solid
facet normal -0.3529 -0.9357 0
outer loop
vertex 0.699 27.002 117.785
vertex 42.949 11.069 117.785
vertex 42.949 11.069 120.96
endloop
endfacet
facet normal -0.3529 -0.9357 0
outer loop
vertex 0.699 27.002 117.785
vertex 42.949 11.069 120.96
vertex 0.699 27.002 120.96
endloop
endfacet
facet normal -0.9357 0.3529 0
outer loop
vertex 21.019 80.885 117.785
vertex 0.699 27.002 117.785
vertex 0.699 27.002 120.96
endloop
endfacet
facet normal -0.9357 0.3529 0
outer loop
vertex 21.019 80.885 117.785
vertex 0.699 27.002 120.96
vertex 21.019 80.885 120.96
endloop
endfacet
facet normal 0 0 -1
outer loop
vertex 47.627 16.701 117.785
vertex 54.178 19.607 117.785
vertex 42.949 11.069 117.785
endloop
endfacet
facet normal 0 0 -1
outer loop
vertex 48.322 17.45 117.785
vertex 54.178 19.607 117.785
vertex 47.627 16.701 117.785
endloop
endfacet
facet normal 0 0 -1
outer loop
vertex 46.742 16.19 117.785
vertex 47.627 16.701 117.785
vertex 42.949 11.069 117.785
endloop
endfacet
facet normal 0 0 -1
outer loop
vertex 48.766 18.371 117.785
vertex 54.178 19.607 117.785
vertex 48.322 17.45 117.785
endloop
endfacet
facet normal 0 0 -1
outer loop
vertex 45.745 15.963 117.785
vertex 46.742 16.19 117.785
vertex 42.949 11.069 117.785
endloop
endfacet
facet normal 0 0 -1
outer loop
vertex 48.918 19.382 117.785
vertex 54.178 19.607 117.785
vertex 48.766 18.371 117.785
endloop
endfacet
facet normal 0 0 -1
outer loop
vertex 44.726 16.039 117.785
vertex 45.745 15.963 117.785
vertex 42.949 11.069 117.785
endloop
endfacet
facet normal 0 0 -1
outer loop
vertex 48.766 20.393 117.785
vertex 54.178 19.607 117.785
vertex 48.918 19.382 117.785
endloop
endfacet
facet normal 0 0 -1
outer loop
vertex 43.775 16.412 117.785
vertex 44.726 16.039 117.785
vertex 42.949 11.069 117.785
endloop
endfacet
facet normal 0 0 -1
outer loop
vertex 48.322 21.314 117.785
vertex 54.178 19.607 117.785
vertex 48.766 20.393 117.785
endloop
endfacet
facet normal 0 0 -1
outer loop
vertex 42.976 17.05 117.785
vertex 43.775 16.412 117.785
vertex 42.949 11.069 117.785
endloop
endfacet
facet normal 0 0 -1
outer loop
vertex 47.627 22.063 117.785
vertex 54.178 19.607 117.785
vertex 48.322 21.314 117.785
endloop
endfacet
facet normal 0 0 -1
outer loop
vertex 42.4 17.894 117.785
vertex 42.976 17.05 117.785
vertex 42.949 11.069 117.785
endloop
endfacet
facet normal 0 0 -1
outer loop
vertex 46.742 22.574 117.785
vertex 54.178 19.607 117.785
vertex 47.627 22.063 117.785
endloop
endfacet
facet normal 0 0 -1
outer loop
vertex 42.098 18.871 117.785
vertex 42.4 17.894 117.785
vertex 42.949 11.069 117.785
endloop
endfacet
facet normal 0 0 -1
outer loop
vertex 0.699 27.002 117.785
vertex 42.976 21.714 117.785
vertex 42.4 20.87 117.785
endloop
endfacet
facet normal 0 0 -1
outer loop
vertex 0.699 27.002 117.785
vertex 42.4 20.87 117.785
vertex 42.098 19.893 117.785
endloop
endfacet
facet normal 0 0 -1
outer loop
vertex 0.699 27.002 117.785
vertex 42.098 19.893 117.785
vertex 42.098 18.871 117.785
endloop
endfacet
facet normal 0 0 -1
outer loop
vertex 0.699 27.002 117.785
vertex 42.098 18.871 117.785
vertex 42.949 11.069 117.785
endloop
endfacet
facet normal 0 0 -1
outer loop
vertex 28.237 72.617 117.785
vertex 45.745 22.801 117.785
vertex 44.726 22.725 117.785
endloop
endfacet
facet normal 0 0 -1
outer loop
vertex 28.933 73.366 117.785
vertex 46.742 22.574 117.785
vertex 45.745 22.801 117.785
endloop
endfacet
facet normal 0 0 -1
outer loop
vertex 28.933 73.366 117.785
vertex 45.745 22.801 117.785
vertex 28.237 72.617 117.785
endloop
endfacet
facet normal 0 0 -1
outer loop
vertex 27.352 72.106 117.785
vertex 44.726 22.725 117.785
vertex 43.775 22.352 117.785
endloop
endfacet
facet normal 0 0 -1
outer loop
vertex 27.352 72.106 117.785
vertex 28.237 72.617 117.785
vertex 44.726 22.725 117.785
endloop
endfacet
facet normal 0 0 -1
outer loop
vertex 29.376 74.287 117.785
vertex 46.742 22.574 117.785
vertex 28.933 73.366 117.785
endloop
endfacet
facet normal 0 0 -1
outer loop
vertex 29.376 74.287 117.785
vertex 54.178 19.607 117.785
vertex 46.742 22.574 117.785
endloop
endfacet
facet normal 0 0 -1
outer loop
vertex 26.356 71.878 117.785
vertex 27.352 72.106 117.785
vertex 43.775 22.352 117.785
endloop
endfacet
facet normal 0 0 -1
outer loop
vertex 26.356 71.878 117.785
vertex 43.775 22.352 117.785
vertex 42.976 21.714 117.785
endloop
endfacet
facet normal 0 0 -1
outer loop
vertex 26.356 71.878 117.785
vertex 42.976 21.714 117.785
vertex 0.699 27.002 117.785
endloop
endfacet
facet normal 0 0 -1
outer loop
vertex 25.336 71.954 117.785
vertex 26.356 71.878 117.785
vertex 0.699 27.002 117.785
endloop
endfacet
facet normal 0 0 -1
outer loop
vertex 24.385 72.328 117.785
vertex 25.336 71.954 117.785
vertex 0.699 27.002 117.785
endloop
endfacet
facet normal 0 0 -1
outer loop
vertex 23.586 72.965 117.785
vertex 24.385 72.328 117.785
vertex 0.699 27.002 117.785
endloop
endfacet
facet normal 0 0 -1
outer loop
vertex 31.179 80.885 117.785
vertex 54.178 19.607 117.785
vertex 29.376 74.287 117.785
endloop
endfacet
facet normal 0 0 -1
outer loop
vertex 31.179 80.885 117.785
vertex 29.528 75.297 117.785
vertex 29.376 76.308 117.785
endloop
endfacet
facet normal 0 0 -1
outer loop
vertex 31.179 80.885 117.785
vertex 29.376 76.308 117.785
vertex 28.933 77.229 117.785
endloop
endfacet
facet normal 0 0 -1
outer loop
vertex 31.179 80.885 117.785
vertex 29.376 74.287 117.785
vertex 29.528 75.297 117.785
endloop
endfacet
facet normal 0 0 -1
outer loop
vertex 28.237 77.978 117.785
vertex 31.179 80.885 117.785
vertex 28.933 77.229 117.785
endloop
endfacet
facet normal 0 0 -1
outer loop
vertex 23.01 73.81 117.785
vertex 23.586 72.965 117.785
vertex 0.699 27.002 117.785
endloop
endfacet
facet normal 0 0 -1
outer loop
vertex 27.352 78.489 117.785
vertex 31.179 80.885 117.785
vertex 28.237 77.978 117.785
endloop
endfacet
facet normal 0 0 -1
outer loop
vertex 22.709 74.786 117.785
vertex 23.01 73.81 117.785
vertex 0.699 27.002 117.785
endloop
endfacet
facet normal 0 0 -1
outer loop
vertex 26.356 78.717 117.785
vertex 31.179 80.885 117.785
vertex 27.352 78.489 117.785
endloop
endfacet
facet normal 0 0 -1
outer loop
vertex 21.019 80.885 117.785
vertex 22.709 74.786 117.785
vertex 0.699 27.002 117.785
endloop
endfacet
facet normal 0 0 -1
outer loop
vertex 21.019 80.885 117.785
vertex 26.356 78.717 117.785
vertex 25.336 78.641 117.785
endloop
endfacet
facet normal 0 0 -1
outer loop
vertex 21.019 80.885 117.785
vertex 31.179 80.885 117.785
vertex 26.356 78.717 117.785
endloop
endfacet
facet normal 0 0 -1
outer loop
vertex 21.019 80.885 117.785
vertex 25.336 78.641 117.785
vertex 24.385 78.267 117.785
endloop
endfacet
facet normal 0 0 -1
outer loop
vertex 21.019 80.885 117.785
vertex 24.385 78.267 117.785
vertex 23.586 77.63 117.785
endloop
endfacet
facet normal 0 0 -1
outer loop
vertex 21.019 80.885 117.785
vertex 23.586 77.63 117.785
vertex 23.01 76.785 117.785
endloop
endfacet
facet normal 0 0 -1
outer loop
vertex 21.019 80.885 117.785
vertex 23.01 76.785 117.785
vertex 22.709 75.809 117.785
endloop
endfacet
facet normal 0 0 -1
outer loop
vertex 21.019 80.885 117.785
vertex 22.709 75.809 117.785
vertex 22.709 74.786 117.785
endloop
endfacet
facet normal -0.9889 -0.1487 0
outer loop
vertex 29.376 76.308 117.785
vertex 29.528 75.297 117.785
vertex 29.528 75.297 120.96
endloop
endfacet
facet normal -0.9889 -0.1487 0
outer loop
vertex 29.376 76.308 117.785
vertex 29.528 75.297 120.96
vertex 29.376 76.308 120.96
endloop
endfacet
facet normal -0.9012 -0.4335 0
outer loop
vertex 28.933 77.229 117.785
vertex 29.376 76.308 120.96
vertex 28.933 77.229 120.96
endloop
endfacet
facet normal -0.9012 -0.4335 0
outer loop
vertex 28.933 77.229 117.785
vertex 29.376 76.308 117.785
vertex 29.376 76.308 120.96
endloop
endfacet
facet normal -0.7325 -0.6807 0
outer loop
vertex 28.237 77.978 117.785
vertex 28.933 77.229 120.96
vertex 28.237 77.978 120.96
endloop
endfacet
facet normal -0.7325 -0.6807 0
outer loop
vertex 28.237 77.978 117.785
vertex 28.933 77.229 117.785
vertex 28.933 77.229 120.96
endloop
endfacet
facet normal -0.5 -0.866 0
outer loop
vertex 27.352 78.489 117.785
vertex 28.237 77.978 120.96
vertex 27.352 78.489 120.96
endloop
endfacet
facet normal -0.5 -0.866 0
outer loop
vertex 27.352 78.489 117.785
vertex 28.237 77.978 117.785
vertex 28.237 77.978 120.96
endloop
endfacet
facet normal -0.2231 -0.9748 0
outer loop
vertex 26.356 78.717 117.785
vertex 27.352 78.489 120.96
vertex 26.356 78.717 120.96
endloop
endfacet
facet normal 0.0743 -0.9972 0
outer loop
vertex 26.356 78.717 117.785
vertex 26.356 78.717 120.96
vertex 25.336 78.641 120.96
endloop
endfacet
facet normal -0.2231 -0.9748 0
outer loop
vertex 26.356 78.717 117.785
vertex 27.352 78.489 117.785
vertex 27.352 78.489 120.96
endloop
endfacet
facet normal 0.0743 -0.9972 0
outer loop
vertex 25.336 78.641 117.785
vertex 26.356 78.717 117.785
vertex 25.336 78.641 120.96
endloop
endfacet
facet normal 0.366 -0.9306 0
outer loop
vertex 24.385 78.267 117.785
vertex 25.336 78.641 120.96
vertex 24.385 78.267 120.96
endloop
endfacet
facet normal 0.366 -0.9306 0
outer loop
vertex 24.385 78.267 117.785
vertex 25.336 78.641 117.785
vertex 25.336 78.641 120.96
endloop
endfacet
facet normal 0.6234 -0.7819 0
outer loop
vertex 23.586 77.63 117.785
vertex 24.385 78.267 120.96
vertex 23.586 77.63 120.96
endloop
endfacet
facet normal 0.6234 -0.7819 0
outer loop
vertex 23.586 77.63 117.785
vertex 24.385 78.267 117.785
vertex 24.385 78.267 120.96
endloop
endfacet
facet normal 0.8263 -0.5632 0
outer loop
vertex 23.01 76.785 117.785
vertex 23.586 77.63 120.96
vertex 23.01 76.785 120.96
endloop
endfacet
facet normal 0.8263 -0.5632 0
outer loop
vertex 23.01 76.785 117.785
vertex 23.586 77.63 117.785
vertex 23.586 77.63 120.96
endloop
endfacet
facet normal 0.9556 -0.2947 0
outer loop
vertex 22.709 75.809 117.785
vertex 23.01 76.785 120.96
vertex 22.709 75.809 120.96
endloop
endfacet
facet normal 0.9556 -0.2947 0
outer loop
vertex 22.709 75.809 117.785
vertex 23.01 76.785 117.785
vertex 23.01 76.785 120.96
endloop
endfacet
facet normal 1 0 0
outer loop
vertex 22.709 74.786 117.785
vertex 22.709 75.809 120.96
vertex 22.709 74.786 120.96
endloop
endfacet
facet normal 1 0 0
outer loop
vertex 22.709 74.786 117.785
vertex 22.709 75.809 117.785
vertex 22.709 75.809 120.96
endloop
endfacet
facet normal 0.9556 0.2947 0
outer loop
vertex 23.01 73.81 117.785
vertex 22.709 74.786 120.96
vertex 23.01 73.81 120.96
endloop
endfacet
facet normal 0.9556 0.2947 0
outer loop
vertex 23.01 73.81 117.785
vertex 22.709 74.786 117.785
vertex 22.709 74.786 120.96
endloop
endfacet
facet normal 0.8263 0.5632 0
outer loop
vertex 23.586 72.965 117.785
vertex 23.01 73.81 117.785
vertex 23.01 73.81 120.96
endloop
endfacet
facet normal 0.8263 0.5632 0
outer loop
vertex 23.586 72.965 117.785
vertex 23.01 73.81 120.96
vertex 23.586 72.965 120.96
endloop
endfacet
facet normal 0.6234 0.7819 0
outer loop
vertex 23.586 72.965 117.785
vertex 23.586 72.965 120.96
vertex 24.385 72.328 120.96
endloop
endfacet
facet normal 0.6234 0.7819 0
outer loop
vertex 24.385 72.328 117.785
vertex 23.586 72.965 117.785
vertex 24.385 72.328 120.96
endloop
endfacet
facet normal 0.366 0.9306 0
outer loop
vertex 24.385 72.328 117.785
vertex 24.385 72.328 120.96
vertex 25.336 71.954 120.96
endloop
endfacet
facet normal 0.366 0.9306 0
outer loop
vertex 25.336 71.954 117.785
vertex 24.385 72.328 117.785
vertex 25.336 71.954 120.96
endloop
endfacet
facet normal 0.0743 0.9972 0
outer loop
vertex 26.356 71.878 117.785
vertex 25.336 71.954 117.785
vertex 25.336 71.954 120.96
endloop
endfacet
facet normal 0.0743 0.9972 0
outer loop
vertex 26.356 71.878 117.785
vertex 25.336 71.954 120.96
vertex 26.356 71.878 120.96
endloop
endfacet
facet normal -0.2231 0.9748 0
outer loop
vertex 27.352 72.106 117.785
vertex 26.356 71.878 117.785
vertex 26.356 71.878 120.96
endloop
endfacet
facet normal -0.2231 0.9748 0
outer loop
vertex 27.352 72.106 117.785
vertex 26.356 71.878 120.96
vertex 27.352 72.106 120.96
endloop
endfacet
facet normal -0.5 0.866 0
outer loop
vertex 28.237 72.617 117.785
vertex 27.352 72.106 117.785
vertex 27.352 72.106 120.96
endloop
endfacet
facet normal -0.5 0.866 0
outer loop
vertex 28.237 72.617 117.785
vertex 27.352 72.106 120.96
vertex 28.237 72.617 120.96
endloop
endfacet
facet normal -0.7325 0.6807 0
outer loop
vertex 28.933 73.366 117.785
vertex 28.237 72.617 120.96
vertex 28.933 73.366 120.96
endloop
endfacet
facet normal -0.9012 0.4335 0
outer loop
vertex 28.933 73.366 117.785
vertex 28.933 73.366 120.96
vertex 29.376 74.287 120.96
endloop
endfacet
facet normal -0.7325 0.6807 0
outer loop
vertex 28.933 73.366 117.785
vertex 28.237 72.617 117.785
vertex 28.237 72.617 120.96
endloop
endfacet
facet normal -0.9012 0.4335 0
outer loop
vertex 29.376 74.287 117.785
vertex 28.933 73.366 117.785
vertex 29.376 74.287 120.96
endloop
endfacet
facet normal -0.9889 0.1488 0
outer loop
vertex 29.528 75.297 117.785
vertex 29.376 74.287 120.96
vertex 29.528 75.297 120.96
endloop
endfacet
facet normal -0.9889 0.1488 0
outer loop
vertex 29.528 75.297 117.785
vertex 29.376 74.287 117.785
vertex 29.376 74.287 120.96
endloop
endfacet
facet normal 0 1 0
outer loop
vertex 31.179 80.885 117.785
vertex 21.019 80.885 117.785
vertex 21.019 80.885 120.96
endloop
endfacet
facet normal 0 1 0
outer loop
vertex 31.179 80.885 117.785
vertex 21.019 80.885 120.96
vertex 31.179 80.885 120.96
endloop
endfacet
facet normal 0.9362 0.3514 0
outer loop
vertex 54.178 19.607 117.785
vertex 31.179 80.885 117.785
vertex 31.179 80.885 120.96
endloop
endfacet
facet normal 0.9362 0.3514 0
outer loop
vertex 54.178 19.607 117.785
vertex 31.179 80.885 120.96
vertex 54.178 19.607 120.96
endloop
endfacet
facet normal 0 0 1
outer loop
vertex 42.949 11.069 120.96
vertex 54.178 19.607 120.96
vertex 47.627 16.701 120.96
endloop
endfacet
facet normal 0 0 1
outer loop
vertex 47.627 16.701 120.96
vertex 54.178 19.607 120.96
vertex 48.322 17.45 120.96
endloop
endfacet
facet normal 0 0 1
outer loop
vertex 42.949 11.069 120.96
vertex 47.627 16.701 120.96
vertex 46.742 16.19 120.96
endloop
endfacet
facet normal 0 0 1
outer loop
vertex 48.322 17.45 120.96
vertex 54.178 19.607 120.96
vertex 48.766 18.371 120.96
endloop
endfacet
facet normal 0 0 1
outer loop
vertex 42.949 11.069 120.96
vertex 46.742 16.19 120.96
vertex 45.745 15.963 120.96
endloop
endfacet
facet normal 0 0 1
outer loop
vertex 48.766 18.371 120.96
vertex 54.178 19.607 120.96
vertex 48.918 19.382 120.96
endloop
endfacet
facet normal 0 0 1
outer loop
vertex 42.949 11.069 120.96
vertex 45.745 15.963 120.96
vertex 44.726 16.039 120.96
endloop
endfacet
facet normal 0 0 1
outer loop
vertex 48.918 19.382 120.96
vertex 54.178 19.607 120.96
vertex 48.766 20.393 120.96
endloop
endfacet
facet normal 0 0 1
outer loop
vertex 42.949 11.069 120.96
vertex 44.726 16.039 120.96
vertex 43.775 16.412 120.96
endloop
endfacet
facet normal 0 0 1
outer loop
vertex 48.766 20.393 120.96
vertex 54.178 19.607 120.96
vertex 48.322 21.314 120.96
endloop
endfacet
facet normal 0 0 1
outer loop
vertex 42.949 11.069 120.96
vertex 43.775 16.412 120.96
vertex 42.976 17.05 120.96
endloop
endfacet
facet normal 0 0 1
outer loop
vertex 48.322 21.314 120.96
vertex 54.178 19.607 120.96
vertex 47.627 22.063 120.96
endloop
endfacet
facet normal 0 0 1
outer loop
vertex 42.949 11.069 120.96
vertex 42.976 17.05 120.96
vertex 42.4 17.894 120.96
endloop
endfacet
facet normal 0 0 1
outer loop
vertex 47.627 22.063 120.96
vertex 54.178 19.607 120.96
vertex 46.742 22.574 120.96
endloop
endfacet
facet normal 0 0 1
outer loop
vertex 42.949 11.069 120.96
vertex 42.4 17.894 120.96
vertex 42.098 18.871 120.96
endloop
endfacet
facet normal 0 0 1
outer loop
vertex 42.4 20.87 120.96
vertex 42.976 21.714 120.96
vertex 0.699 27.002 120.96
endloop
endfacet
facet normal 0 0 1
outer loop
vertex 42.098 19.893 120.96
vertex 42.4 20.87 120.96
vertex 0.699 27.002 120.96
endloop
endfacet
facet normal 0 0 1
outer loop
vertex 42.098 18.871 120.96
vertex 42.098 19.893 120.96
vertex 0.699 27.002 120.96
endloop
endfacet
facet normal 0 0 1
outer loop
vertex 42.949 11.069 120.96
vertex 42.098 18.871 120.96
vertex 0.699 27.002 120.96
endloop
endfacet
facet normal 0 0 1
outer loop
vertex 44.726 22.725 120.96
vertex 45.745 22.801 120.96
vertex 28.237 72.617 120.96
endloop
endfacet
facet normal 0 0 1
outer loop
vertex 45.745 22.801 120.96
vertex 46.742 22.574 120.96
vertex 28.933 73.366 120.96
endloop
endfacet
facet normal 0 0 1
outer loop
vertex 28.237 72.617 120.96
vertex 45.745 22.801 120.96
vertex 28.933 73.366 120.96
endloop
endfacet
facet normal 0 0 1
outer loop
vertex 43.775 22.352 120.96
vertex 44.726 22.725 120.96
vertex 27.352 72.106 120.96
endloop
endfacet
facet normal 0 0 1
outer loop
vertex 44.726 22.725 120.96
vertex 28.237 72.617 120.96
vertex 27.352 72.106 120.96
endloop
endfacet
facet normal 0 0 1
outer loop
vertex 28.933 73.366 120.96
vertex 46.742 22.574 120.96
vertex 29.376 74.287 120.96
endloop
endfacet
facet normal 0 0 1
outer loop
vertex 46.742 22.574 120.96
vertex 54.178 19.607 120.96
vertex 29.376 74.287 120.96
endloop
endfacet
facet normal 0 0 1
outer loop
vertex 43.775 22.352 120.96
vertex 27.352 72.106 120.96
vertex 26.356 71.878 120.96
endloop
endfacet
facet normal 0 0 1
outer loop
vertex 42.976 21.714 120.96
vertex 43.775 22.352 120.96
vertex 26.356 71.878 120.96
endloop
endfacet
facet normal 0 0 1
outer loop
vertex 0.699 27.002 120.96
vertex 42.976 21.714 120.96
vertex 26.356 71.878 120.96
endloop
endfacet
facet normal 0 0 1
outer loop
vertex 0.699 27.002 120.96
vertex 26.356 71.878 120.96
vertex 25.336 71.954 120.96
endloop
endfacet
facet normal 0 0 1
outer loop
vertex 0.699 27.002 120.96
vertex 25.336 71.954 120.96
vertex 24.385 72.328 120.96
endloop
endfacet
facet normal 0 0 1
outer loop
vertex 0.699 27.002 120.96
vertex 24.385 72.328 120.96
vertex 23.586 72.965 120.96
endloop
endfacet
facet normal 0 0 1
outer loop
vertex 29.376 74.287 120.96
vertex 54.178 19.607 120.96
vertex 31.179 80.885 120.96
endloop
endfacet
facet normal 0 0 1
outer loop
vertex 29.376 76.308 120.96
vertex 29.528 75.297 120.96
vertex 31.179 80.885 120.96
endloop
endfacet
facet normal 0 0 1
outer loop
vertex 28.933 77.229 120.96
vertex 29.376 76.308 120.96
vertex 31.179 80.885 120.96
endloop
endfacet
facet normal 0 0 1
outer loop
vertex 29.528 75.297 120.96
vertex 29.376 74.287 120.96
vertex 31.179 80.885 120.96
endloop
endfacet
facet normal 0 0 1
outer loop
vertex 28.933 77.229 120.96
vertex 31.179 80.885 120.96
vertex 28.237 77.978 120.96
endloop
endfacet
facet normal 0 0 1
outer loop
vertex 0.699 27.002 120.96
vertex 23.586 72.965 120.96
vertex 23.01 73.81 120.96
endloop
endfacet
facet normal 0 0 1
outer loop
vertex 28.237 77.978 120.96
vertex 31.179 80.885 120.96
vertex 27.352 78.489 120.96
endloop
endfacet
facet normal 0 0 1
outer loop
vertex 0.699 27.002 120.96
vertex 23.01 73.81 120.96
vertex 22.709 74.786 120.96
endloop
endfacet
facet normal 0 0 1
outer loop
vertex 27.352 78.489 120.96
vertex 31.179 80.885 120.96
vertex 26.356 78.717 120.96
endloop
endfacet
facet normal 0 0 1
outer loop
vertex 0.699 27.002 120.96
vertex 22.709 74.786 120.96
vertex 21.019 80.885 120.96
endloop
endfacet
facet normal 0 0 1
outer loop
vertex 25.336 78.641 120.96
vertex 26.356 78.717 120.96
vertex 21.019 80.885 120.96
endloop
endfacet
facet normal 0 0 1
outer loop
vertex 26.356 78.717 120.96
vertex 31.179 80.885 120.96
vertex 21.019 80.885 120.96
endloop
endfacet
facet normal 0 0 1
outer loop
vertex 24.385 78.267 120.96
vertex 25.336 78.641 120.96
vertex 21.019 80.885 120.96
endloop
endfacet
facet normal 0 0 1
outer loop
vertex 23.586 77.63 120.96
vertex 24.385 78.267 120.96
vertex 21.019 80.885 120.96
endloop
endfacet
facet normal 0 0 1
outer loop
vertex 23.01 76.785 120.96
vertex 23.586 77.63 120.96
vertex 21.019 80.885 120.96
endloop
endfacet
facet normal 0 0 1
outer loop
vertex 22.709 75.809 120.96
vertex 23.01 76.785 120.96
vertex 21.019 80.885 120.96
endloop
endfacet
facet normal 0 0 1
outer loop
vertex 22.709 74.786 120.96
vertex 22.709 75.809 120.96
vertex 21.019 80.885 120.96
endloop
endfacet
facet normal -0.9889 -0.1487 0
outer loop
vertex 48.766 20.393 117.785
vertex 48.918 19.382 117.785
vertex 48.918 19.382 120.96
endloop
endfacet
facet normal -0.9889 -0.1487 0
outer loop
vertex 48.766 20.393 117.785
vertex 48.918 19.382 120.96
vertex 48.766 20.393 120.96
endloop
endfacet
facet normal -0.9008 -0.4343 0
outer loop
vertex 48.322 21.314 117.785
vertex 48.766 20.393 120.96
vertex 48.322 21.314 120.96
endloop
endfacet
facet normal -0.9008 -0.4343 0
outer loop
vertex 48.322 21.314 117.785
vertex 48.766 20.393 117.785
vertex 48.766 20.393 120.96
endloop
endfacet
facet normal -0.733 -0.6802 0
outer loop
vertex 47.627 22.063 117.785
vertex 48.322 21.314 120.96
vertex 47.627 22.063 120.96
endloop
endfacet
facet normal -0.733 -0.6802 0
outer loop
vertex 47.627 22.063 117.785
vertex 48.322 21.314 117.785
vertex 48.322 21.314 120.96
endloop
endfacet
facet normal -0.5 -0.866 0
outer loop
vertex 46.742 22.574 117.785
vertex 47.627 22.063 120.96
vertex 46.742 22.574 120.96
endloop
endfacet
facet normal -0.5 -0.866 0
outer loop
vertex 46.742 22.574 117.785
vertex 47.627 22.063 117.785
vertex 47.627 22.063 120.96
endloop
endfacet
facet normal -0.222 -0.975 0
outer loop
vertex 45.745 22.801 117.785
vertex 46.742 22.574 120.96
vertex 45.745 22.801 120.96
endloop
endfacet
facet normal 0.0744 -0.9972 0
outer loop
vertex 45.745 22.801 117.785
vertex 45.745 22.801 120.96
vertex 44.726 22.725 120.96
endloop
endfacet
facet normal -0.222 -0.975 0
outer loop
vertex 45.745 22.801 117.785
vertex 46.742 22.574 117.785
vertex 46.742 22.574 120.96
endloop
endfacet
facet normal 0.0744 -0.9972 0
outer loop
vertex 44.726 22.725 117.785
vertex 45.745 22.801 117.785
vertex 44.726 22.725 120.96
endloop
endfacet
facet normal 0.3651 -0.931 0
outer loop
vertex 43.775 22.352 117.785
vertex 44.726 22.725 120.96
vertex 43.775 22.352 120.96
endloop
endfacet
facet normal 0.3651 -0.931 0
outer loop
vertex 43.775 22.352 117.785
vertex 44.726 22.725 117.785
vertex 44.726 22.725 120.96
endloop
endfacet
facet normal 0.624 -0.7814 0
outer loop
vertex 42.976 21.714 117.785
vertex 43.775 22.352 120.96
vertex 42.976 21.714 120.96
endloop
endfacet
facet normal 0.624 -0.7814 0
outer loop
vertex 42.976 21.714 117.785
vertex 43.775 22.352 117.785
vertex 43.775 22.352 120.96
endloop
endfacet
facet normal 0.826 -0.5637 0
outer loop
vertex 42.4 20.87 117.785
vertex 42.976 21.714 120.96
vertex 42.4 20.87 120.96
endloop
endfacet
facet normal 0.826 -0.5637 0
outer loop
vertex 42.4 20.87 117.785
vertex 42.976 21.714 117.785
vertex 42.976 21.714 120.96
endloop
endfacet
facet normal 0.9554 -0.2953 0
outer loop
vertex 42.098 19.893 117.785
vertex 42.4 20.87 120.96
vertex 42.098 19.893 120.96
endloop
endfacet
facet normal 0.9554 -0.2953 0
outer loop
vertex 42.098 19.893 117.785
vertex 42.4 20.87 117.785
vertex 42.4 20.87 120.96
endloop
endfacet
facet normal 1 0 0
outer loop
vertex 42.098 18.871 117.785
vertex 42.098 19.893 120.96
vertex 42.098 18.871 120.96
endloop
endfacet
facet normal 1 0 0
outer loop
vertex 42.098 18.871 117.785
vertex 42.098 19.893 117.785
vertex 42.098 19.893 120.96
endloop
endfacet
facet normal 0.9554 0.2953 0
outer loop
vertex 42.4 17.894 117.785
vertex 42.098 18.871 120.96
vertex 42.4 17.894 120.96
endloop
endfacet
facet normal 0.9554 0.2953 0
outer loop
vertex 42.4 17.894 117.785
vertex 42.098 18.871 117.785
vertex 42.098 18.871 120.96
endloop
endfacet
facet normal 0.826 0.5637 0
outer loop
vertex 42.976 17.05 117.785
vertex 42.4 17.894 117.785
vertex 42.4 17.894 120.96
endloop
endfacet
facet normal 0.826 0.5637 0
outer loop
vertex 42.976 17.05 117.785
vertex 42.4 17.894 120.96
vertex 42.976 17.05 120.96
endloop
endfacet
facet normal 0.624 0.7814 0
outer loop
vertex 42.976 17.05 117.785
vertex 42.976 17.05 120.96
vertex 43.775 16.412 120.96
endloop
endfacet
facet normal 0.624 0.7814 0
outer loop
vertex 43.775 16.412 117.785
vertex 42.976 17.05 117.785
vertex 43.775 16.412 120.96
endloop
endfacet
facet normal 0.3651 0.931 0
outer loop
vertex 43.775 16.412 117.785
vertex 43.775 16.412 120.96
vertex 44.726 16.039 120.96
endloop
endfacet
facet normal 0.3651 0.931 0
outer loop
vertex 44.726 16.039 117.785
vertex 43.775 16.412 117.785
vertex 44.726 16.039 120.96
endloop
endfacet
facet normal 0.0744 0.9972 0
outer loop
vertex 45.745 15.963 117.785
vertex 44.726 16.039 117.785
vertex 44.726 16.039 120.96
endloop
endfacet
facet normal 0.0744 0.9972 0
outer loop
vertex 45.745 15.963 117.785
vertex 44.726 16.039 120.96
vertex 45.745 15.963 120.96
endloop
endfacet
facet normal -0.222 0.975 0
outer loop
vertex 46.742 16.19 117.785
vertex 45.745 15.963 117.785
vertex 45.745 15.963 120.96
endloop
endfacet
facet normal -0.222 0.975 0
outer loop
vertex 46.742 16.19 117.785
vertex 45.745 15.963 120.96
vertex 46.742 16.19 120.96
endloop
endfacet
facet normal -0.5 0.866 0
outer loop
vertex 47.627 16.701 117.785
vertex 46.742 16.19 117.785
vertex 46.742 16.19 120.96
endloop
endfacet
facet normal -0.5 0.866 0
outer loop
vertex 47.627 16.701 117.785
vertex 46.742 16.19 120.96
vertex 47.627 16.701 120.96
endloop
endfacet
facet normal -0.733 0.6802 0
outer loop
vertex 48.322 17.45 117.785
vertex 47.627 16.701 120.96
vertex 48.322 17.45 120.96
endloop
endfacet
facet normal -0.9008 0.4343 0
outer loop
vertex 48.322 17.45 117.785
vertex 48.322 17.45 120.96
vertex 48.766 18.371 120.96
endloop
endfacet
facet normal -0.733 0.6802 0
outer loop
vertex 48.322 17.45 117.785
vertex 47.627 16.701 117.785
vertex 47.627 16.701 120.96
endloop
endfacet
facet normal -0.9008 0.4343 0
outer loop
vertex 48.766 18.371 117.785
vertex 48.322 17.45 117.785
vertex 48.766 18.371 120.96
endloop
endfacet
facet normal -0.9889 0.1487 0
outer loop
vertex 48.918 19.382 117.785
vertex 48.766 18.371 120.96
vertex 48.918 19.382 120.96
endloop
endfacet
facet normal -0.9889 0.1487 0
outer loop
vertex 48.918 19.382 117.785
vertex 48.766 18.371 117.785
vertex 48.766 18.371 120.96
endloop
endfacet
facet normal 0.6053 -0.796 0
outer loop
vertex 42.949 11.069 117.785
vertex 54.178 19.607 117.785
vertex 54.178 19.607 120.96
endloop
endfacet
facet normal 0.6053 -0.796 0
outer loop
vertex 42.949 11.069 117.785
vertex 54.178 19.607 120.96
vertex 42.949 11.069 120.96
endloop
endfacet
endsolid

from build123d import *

# Parameters (mm, degrees)
SKETCH1_R           = 3.429
BOSS_EXTRUDE1_DEPTH = 3.175


with BuildPart() as part:
    # Sketch1 → Boss-Extrude1 (new body)
    with BuildSketch(Plane.XY.offset(117.785358826)):
        Polygon((54.178453288, 19.606929499), (42.949199141, 11.069173633), (0.699486381, 27.001944289), (21.019486381, 80.885489203), (31.179486381, 80.885489203), align=None)
        with Locations((45.489199141, 19.381944289)):
            Circle(SKETCH1_R, mode=Mode.SUBTRACT)
        with Locations((26.099486381, 75.297489203)):
            Circle(SKETCH1_R, mode=Mode.SUBTRACT)
    extrude(amount=BOSS_EXTRUDE1_DEPTH)


solid = part.part
